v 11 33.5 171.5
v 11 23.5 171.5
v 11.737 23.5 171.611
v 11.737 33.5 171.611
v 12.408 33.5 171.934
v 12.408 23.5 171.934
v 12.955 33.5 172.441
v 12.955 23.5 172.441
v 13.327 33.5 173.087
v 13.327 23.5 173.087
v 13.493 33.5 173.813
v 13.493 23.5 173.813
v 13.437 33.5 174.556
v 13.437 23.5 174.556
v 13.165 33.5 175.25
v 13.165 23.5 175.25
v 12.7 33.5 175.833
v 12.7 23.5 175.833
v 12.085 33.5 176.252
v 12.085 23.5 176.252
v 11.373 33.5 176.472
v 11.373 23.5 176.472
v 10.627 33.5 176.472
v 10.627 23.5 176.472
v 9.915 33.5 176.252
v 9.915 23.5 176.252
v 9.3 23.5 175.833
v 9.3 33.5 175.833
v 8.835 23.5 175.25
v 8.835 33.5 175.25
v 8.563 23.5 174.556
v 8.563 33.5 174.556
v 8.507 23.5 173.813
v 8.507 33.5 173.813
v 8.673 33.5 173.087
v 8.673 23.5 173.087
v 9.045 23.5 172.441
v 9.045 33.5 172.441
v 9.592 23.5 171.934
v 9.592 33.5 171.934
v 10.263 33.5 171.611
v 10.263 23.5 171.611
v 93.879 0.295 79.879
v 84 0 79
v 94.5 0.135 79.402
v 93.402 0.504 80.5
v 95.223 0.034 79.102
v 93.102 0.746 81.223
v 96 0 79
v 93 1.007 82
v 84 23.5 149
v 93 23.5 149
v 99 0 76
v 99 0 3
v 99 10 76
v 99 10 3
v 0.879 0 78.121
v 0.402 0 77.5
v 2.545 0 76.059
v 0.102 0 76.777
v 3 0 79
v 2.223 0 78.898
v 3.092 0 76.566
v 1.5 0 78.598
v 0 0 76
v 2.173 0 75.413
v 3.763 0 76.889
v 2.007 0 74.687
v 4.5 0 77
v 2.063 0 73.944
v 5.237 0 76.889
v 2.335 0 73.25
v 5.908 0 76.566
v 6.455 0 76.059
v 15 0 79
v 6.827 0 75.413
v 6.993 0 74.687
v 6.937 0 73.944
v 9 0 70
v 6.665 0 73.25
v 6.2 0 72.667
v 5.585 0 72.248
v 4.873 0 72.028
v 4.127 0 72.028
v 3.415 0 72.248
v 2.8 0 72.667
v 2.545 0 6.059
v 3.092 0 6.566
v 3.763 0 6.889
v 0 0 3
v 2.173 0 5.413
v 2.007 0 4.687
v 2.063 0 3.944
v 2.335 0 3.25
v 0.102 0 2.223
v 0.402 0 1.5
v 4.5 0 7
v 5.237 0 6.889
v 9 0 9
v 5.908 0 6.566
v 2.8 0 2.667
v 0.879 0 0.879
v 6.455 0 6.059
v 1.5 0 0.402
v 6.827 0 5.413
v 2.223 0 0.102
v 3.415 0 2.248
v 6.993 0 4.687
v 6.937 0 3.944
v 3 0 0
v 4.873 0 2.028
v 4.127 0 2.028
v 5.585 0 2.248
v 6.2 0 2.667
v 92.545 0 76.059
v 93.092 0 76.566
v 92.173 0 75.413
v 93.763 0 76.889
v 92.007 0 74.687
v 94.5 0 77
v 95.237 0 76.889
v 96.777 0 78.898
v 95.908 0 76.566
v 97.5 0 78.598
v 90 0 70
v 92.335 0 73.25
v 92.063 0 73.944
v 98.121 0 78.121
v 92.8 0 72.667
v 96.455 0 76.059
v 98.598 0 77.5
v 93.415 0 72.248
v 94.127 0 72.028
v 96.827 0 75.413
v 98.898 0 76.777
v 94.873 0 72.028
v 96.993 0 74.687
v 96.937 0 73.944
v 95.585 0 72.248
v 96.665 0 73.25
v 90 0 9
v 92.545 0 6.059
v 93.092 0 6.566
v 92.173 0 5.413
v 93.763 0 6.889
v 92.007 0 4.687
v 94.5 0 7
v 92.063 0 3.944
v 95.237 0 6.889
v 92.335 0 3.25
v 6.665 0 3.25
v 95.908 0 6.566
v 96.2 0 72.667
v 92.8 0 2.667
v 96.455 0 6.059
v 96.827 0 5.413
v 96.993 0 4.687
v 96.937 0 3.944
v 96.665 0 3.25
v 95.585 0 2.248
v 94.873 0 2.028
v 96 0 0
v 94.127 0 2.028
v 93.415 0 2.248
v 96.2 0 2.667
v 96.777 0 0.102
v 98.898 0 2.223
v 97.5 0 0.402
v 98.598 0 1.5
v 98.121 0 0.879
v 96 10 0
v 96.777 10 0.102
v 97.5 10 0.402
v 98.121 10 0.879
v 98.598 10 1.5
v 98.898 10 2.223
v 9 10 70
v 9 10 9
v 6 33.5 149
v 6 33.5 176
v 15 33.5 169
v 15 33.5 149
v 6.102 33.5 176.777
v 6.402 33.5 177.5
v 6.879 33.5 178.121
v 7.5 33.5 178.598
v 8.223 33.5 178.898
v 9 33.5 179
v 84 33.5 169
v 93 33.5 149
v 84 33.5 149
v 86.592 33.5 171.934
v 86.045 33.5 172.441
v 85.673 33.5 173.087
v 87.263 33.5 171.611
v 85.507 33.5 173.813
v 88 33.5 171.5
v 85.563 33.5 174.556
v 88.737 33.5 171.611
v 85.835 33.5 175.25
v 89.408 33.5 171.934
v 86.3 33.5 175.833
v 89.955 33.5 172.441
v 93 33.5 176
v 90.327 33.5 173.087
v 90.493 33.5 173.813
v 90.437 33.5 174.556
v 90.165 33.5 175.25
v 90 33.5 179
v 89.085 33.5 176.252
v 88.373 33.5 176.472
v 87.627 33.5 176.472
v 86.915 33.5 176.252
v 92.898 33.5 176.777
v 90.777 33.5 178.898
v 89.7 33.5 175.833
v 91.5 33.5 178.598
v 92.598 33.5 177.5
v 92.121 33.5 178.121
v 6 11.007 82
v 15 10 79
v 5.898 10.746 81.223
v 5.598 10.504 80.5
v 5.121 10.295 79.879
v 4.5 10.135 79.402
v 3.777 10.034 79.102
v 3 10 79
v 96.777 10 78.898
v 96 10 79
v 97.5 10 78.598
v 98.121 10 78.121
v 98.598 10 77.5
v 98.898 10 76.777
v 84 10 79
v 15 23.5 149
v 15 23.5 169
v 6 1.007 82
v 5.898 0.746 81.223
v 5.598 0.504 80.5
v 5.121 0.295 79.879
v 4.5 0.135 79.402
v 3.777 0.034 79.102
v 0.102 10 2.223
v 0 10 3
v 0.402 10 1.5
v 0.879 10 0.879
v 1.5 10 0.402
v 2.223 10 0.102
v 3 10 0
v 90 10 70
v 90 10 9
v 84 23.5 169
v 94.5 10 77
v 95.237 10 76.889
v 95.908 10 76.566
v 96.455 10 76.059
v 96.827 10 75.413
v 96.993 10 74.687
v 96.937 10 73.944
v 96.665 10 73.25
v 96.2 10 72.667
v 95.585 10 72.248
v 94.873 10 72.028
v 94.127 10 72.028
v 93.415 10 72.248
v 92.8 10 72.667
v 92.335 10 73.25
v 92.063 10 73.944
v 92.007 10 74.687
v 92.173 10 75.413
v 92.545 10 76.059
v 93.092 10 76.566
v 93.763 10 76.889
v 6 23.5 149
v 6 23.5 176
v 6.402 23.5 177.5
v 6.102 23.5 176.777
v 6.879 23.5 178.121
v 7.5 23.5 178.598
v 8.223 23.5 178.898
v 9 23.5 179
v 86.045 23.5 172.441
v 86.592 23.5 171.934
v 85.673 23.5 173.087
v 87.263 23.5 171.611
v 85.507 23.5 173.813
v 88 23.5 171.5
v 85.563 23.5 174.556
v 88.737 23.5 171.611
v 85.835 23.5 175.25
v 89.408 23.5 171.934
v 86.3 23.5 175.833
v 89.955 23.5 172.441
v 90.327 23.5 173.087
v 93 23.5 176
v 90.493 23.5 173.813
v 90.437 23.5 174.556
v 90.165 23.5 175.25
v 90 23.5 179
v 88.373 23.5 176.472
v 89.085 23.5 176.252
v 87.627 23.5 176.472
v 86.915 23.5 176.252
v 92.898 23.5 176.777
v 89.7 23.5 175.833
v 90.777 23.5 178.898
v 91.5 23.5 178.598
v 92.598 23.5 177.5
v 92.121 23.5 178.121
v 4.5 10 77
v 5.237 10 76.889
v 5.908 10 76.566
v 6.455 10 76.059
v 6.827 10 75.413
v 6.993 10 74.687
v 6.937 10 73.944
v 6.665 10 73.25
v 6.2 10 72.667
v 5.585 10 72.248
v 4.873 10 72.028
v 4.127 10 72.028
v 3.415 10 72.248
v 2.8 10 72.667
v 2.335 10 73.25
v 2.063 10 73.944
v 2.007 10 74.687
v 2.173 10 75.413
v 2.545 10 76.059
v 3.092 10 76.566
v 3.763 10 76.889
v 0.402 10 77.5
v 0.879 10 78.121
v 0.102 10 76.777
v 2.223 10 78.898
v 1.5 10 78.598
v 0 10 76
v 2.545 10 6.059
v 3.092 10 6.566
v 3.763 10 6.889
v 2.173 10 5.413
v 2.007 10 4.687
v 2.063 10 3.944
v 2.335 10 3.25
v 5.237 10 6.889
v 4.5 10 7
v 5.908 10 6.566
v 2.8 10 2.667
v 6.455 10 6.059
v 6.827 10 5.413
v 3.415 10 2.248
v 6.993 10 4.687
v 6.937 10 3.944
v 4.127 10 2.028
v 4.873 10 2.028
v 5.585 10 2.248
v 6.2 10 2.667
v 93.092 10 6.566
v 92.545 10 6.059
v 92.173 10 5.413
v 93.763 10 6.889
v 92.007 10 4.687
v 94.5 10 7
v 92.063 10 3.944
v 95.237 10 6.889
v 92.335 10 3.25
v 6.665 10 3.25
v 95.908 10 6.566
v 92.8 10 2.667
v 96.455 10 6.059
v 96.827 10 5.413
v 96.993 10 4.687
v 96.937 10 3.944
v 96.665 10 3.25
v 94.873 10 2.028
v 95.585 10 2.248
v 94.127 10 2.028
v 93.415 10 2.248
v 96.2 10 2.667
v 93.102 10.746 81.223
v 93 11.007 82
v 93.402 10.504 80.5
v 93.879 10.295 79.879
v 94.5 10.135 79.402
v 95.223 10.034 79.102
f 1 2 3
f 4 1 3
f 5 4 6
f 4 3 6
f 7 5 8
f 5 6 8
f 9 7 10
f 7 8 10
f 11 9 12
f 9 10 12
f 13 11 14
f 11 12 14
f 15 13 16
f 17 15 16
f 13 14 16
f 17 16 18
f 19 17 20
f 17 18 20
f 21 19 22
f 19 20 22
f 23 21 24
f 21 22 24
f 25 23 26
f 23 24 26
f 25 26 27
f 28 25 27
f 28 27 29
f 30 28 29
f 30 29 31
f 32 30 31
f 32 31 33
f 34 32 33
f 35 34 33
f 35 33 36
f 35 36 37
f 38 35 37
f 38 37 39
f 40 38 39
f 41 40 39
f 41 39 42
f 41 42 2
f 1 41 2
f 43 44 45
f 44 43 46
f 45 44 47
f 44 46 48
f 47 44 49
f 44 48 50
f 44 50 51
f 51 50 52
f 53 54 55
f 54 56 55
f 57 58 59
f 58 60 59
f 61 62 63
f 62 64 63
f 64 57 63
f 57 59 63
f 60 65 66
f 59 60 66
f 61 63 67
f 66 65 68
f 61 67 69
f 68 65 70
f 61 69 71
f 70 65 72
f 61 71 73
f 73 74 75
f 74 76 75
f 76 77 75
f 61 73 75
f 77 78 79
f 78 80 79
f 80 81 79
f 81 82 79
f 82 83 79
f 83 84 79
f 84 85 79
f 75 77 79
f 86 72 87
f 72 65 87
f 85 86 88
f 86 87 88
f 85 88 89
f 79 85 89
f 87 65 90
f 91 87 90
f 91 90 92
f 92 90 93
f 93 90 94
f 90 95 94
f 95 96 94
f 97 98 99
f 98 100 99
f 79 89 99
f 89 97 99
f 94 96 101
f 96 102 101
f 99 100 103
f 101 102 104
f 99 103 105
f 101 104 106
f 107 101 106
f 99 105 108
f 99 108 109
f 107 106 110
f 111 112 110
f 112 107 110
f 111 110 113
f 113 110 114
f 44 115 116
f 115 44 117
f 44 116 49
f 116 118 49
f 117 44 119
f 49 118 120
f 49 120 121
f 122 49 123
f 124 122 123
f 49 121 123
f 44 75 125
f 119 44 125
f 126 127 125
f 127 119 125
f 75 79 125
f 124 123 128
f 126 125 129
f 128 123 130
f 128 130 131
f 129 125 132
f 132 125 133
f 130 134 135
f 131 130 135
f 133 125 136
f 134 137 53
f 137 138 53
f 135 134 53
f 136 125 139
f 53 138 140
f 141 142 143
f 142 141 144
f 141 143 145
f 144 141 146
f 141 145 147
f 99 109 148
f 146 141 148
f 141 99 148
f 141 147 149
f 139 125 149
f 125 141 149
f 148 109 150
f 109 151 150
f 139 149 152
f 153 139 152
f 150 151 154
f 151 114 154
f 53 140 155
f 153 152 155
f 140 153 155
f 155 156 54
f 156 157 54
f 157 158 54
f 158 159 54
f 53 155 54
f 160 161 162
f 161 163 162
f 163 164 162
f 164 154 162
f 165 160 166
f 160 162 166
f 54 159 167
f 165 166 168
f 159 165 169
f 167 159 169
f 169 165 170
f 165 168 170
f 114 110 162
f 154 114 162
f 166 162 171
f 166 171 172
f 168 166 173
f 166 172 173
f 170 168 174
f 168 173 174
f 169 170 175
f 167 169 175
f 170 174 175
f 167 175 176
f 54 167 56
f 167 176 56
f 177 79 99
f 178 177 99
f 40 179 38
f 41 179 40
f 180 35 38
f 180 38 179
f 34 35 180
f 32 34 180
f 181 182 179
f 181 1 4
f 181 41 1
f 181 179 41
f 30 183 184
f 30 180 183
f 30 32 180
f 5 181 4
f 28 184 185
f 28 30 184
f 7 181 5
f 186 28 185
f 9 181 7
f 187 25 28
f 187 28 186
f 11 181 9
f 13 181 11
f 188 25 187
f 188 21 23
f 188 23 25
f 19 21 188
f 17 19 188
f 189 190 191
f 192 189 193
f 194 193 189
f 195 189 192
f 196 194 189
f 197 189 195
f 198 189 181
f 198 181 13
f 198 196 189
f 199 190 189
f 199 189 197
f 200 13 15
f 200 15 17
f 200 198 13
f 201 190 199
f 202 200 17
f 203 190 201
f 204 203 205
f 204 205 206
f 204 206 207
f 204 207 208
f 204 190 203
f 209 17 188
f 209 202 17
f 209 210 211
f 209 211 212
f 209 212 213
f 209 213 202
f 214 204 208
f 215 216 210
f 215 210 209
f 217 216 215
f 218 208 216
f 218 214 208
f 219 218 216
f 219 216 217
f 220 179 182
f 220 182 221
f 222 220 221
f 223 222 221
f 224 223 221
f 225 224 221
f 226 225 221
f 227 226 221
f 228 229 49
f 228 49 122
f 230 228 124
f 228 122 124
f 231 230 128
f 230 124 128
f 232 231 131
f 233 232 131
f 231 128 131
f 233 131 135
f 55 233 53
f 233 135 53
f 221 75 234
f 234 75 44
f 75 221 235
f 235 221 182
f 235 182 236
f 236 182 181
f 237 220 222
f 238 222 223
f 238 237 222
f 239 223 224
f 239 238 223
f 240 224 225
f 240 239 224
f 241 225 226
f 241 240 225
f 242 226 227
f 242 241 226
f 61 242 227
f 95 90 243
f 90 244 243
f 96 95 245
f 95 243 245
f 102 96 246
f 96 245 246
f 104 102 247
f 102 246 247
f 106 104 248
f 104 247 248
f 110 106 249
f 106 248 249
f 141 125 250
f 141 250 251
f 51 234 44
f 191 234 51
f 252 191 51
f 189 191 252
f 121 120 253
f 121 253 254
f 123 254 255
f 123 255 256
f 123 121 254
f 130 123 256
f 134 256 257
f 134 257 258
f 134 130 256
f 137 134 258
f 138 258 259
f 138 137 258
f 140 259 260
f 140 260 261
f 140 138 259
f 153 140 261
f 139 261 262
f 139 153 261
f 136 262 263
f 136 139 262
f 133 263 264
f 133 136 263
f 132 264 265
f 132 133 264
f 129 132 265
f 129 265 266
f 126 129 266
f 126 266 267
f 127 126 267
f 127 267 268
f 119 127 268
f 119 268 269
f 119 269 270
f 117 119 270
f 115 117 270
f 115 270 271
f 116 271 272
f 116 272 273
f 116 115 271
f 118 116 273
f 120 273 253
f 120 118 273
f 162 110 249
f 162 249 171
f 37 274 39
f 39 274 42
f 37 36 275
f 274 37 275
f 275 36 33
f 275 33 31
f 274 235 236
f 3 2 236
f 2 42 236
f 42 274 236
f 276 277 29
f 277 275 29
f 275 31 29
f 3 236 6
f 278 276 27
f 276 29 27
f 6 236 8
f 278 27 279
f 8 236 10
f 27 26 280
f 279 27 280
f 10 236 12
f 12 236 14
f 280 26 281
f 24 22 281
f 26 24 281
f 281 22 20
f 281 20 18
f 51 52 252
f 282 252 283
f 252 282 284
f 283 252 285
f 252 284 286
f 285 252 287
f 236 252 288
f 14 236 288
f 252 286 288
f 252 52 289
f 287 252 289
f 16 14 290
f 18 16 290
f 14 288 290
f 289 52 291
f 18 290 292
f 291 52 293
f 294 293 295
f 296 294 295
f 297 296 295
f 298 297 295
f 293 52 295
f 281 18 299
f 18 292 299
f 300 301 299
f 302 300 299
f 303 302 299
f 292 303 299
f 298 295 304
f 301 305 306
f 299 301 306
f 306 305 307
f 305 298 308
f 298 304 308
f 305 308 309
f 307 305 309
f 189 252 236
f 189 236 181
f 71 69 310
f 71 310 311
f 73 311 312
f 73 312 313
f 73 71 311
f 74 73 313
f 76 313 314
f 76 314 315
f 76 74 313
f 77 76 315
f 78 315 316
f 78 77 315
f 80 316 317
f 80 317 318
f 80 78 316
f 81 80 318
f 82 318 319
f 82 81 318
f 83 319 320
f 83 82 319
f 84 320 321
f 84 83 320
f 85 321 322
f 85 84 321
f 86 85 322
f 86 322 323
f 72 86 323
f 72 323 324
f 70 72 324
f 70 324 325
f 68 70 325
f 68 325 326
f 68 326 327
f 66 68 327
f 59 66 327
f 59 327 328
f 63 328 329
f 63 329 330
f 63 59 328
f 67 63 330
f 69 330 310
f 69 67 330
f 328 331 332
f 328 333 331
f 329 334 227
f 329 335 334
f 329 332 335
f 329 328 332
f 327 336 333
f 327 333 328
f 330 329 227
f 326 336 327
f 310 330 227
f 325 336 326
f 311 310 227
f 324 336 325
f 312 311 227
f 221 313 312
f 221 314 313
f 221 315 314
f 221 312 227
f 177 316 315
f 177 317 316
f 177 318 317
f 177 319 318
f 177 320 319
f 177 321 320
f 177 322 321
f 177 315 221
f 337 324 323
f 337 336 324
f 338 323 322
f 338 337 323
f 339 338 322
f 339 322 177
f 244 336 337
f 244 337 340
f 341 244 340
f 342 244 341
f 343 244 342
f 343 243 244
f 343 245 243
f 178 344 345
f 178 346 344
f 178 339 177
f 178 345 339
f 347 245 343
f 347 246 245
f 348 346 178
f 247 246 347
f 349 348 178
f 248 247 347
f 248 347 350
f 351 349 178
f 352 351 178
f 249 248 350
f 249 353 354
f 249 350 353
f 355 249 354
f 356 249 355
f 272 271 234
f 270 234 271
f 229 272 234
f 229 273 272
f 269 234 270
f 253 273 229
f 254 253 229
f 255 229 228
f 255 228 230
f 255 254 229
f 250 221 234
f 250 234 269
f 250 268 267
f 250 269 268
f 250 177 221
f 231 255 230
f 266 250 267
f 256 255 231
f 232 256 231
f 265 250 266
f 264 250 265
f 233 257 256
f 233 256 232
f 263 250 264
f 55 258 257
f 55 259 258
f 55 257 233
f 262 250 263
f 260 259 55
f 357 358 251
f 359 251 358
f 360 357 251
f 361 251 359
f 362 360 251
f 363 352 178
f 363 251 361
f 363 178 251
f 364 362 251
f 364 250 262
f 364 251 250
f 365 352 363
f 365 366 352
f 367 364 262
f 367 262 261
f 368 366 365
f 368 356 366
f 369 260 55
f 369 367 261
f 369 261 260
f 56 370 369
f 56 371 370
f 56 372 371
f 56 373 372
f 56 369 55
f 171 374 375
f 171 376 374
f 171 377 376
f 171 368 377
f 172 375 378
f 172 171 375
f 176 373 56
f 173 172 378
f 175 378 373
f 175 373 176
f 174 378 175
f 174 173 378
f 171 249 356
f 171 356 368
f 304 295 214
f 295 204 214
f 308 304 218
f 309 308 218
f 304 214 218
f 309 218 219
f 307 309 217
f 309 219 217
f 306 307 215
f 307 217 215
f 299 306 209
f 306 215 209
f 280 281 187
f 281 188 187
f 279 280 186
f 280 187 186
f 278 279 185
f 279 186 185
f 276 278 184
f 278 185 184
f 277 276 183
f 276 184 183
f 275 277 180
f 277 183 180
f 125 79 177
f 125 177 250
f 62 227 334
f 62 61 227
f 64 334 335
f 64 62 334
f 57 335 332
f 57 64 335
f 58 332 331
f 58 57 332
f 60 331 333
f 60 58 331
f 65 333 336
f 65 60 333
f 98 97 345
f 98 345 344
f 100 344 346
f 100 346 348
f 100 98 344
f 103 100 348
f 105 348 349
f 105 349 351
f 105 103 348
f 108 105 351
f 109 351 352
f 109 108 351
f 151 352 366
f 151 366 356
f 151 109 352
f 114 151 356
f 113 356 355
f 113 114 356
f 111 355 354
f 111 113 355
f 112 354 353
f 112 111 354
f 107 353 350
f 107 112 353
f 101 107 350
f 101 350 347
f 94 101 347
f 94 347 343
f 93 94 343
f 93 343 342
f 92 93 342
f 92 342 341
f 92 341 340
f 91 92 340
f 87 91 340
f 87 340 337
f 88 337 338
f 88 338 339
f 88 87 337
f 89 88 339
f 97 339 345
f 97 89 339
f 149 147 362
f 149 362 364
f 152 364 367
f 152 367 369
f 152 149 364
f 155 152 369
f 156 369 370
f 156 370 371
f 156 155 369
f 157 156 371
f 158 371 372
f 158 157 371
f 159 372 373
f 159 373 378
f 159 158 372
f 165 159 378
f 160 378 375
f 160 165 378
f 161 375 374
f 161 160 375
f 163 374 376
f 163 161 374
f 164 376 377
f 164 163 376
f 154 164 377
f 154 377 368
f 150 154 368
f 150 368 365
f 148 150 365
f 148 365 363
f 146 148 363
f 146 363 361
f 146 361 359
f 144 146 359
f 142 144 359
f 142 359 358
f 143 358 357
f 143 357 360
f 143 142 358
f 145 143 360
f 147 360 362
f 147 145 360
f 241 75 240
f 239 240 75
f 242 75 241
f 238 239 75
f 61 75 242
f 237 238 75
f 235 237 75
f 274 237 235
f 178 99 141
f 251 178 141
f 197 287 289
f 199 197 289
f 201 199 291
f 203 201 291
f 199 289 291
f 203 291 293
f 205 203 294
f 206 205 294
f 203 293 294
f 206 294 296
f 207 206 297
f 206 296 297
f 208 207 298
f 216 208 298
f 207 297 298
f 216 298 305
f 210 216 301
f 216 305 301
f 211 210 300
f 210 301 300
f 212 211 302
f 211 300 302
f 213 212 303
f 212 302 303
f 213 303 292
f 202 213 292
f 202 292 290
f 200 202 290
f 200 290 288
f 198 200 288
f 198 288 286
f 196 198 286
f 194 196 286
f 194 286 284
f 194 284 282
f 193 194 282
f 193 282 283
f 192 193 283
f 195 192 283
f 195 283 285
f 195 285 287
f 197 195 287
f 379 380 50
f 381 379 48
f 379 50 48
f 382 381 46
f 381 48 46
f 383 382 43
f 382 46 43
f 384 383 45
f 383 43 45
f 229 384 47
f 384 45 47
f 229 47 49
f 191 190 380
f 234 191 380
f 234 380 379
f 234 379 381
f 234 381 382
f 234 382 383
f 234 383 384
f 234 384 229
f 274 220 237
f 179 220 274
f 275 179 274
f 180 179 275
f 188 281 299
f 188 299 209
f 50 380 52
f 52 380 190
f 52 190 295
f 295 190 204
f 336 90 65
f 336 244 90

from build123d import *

# Parameters (mm, degrees)
SKETCH_1_W          = 99
SKETCH_1_H          = 79
SKETCH_1_R          = 2.5
SKETCH_1_W_2        = 81
SKETCH_1_H_2        = 61
EXTRUDE_1_DEPTH     = 10
EXTRUDE_2_DEPTH     = 15
CUT_EXTRUDE_1_DEPTH = 6
EXTRUDE_3_REACH     = 202.547
SKETCH_7_W          = 10
SKETCH_7_H          = 10
SKETCH_8_R          = 2.5
CUT_EXTRUDE_2_DEPTH = 206.898640112
FILLET_1_R          = 3


with BuildPart() as part:
    # 草图1 → 凸台-拉伸1 (new body)
    with BuildSketch(Plane(origin=(0, 0, 0), x_dir=(1, 0, 0), z_dir=(0, 1, 0))):
        with Locations((49.5, -39.5)):
            Rectangle(SKETCH_1_W, SKETCH_1_H)
        with Locations(Location((94.5, -4.5, 0), (0, 0, 270))):
            Circle(SKETCH_1_R, mode=Mode.SUBTRACT)
        with Locations(Location((4.5, -4.5, 0), (0, 0, 270))):
            Circle(SKETCH_1_R, mode=Mode.SUBTRACT)
        with Locations(Location((4.5, -74.5, 0), (0, 0, 270))):
            Circle(SKETCH_1_R, mode=Mode.SUBTRACT)
        with Locations(Location((94.5, -74.5, 0), (0, 0, 270))):
            Circle(SKETCH_1_R, mode=Mode.SUBTRACT)
        with Locations((49.5, -39.5)):
            Rectangle(SKETCH_1_W_2, SKETCH_1_H_2, mode=Mode.SUBTRACT)
    extrude(amount=EXTRUDE_1_DEPTH)

    # 草图4 → 凸台-拉伸2 (add)
    with BuildSketch(Plane(origin=(99, 0, 0), x_dir=(0, 0, -1), z_dir=(1, 0, 0))):
        Polygon((-79, 0), (-149, 23.5), (-179, 23.5), (-179, 33.5), (-149, 33.5), (-79, 10), align=None)
    extrude_2 = extrude(amount=-EXTRUDE_2_DEPTH)

    # 镜向1: 凸台-拉伸2 across plane
    add(extrude_2.mirror(Plane.ZY.offset(-49.5)))

    # 草图4<2> → 切除-拉伸1 (cut)
    with BuildSketch(Plane(origin=(99, 0, 0), x_dir=(0, 0, -1), z_dir=(1, 0, 0))):
        Polygon((-79, 0), (-149, 23.5), (-179, 23.5), (-179, 33.5), (-149, 33.5), (-79, 10), align=None)
    cut_extrude_1 = extrude(amount=-CUT_EXTRUDE_1_DEPTH, mode=Mode.SUBTRACT)

    # 镜向2: 切除-拉伸1 across plane
    add(cut_extrude_1.mirror(Plane.ZY.offset(-49.5)), mode=Mode.SUBTRACT)

    # 草图7 → 凸台-拉伸3 (add, up to next)
    with BuildSketch(Plane.ZY.offset(-84), mode=Mode.PRIVATE) as extrude_3_sk1:
        with Locations((174, 28.5)):
            Rectangle(SKETCH_7_W, SKETCH_7_H)
    extrude_3_tool1 = extrude(extrude_3_sk1.sketch, amount=EXTRUDE_3_REACH, mode=Mode.PRIVATE) - part.part
    add(extrude_3_tool1.solids().sort_by_distance((84, 28.5, 174))[0])

    # 草图8 → 切除-拉伸2 (cut, through all)
    with BuildSketch(Plane.XZ.offset(-23.5)):
        with Locations(Location((88, 174, 0), (0, 0, 270))):
            Circle(SKETCH_8_R)
        with Locations(Location((11, 174, 0), (0, 0, 270))):
            Circle(SKETCH_8_R)
    extrude(amount=-CUT_EXTRUDE_2_DEPTH, mode=Mode.SUBTRACT)

    # 圆角1
    fillet_1_edges = [part.edges().sort_by_distance(p)[0] for p in [
        (0, 5, 79),
        (6, 5, 79),
        (6, 28.5, 179),
        (0, 5, 0),
        (99, 5, 0),
        (93, 5, 79),
        (93, 28.5, 179),
        (99, 5, 79),
    ]]
    fillet(fillet_1_edges, radius=FILLET_1_R - 0.0001)  # a hair under: the kernel refuses the full size


solid = part.part
